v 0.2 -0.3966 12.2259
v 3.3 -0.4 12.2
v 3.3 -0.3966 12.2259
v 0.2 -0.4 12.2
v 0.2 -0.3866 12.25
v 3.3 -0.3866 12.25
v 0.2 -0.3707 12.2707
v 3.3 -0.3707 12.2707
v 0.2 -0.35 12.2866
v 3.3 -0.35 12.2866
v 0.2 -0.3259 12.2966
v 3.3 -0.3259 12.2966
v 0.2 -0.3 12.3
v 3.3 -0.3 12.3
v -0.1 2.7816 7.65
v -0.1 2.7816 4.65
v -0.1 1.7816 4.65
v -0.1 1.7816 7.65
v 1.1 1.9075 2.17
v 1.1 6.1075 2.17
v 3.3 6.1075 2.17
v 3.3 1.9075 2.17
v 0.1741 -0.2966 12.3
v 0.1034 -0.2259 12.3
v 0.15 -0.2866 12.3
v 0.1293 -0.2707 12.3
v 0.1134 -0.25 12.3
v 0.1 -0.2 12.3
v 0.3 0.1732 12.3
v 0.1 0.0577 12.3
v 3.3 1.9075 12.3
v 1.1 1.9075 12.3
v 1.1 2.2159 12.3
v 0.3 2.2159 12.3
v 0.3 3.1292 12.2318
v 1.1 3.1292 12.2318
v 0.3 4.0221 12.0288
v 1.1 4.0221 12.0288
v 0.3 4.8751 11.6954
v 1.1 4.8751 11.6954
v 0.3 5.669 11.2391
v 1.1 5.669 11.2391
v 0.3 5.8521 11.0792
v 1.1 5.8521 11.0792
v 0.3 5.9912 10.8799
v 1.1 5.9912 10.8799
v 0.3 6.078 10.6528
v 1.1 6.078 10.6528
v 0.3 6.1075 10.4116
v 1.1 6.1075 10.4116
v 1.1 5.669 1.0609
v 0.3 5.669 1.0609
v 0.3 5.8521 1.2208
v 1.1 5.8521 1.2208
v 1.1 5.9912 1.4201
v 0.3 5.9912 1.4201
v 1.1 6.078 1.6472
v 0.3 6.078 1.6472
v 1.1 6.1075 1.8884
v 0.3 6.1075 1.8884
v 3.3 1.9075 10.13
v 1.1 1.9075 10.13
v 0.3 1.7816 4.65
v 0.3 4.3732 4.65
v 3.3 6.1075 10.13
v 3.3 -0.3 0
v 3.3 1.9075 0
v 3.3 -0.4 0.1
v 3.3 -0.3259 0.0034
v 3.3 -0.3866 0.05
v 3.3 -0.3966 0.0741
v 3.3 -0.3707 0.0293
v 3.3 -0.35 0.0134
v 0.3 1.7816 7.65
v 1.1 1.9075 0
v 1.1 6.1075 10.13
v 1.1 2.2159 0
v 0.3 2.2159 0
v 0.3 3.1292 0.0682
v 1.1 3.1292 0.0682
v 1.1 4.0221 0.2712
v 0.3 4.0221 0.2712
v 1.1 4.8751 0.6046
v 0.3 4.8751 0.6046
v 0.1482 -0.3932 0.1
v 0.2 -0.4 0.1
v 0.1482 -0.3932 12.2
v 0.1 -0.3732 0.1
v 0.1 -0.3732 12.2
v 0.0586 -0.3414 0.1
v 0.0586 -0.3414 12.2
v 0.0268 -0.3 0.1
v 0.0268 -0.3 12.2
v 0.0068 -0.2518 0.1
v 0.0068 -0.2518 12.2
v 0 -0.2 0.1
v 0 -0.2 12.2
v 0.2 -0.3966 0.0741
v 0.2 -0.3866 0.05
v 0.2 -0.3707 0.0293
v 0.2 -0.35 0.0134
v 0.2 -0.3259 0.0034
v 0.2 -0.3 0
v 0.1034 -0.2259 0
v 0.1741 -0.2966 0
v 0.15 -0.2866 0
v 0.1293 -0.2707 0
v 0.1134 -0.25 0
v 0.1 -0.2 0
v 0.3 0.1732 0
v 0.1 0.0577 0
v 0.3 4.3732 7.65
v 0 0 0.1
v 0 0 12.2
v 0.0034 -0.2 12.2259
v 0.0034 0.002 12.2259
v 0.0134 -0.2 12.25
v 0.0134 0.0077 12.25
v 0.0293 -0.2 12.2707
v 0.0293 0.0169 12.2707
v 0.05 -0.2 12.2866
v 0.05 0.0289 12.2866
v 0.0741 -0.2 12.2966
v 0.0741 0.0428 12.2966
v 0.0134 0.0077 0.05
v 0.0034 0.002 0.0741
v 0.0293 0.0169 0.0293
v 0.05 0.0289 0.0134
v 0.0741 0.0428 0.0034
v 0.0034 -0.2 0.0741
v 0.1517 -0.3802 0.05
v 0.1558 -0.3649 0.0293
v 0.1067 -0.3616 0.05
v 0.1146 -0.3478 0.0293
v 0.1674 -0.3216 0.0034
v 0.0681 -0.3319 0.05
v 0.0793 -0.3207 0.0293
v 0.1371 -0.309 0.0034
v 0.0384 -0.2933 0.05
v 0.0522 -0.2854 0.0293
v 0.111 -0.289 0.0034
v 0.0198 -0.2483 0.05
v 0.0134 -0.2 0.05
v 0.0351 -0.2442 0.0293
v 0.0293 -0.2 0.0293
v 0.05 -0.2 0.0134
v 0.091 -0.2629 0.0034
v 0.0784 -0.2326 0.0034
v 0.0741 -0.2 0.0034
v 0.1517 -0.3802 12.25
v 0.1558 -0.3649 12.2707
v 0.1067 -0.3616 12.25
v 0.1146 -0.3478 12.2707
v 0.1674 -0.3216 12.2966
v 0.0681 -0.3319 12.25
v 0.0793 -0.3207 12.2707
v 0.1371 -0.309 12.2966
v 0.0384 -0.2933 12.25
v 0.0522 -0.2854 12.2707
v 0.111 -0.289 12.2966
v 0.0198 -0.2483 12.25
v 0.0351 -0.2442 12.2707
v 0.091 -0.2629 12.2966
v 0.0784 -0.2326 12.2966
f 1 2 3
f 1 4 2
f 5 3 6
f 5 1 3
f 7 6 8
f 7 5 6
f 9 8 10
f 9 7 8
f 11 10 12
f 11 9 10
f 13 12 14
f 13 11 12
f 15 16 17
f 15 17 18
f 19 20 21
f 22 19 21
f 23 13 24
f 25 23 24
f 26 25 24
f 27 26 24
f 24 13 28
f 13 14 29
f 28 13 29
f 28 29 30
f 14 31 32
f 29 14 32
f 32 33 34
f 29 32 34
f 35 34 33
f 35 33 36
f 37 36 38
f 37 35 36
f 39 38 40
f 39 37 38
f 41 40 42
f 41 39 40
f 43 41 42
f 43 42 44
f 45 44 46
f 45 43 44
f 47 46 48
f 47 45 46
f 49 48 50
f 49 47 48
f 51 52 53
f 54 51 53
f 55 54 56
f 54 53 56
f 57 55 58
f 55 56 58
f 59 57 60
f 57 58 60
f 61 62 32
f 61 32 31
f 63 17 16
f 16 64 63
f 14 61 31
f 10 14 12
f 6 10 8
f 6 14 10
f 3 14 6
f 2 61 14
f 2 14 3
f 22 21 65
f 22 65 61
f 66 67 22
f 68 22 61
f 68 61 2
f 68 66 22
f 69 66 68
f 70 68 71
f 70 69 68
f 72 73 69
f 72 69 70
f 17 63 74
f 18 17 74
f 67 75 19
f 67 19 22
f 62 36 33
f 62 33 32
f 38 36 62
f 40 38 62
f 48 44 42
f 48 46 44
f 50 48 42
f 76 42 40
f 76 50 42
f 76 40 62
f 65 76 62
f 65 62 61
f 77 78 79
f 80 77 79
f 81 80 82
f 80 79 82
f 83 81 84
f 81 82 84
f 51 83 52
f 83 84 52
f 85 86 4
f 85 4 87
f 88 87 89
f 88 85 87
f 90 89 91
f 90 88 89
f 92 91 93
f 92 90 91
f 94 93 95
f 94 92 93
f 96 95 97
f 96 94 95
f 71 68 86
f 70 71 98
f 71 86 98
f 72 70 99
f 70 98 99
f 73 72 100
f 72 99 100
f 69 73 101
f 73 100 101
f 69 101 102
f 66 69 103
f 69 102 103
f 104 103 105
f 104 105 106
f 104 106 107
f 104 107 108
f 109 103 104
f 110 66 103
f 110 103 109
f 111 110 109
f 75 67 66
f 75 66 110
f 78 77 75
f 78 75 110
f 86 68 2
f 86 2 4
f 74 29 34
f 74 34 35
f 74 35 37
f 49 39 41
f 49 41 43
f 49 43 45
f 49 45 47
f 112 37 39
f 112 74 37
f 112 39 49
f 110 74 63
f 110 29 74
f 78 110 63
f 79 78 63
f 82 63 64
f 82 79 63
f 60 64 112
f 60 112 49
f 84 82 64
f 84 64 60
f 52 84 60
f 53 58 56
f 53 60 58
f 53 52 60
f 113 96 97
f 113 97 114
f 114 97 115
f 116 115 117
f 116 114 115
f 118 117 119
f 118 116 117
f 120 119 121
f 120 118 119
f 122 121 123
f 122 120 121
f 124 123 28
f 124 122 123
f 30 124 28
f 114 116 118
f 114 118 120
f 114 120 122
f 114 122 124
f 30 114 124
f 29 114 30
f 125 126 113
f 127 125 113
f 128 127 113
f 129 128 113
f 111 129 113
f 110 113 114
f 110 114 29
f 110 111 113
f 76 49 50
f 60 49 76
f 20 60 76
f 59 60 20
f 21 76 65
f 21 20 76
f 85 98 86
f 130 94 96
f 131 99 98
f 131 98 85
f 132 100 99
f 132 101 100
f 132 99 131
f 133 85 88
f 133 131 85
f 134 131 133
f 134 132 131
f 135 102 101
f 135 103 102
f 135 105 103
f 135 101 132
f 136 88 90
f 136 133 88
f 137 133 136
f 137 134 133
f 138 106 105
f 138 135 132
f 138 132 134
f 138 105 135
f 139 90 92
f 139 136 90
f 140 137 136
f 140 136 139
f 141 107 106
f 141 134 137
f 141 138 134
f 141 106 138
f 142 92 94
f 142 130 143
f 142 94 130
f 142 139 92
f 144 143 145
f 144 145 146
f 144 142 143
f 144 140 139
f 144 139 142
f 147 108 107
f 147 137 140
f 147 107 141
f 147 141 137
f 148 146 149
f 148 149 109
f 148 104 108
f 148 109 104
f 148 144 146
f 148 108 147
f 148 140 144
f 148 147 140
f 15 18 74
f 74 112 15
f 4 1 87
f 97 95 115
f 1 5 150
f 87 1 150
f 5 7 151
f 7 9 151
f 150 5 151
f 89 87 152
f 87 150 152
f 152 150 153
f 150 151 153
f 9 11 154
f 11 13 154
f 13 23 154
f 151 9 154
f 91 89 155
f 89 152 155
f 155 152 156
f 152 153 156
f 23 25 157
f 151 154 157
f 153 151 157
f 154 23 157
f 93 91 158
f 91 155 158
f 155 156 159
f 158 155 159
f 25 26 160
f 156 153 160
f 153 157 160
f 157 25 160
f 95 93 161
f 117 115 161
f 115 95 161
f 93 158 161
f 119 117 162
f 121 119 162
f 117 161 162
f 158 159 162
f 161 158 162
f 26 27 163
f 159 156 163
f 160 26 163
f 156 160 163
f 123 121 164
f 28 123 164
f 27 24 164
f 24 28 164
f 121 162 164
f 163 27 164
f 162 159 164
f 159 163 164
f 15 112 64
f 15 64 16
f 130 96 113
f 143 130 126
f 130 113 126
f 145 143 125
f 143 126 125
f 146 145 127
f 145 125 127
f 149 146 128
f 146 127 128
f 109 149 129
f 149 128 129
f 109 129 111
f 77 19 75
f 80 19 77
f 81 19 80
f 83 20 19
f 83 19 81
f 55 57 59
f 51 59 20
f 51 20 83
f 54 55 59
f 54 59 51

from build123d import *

# Parameters (mm, degrees)
BOSS_EXTRUDE1_DEPTH = 12.3
SKETCH2_W           = 2.2
SKETCH2_H           = 2.17
CUT_EXTRUDE1_DEPTH  = 4.2
CUT_EXTRUDE3_DEPTH  = 0.8
SKETCH5_W           = 3
SKETCH5_H           = 1
BOSS_EXTRUDE2_DEPTH = 0.4
BOSS_EXTRUDE3_DEPTH = 3
FILLET1_R           = 0.1


with BuildPart() as part:
    # Sketch1 → Boss-Extrude1 (new body)
    with BuildSketch(Plane.XY):
        with BuildLine():
            Line((0, 0), (0.299997713, 0.173208719))
            Line((0.299997713, 0.173208719), (0.299997713, 1.781598719))
            Line((0.299997713, 1.781598719), (0.299997713, 6.107458719))
            Line((0.299997713, 6.107458719), (3.299997713, 6.107458719))
            Line((3.299997713, 6.107458719), (3.299997713, 0.646828719))
            Line((3.299997713, 0.646828719), (3.299997713, -0.4))
            Line((3.299997713, -0.4), (0.2, -0.4))
            ThreePointArc((0.2, -0.4), (0.058578644, -0.341421356), (0, -0.2))
            Line((0, -0.2), (0, 0))
        make_face()
    extrude(amount=BOSS_EXTRUDE1_DEPTH)

    # Sketch2 → Cut-Extrude1 (cut)
    with BuildSketch(Plane(origin=(0, 6.107458719, 0), x_dir=(1, 0, 0), z_dir=(0, 1, 0))):
        with Locations((2.199997713, -1.085)):
            Rectangle(SKETCH2_W, SKETCH2_H)
        with Locations((2.199997713, -11.215)):
            Rectangle(SKETCH2_W, SKETCH2_H)
    extrude(amount=-CUT_EXTRUDE1_DEPTH, mode=Mode.SUBTRACT)

    # Sketch4 → Cut-Extrude3 (cut)
    with BuildSketch(Plane.ZY.offset(-0.299997713)):
        with BuildLine():
            Line((10.41158, 6.107458719), (12.3, 6.107458719))
            Line((12.3, 6.107458719), (12.3, 2.215929667))
            ThreePointArc((12.3, 2.215929667), (12.02880398, 4.022129667), (11.23913234, 5.669043272))
            ThreePointArc((11.23913234, 5.669043272), (10.879869522, 5.991150317), (10.41158, 6.107458719))
        make_face()
        with BuildLine():
            Line((1.88842, 6.107458719), (0, 6.107458719))
            Line((0, 6.107458719), (0, 2.215929667))
            ThreePointArc((0, 2.215929667), (0.27119602, 4.022129667), (1.06086766, 5.669043272))
            ThreePointArc((1.06086766, 5.669043272), (1.420130478, 5.991150317), (1.88842, 6.107458719))
        make_face()
    extrude(amount=-CUT_EXTRUDE3_DEPTH, mode=Mode.SUBTRACT)

    # Sketch5 → Boss-Extrude2 (add)
    with BuildSketch(Plane.ZY.offset(-0.299997713)):
        with Locations((6.15, 2.281598719)):
            Rectangle(SKETCH5_W, SKETCH5_H)
    extrude(amount=BOSS_EXTRUDE2_DEPTH)

    # Sketch6 → Boss-Extrude3 (add)
    with BuildSketch(Plane.XY.offset(7.65)):
        Polygon((0.299997713, 2.781598719), (0.299997713, 4.373208719), (-0.100002287, 2.781598719), align=None)
    extrude(amount=-BOSS_EXTRUDE3_DEPTH)

    # Fillet1
    fillet1_edges = [part.edges().sort_by_distance(p)[0] for p in [
        (1.749998857, -0.4, 12.3),
        (1.749998857, -0.4, 0),
        (0.058578644, -0.341421356, 0),
        (0, -0.1, 0),
        (0, -0.1, 12.3),
        (0.058578644, -0.341421356, 12.3),
    ]]
    fillet(fillet1_edges, radius=FILLET1_R)


solid = part.part
